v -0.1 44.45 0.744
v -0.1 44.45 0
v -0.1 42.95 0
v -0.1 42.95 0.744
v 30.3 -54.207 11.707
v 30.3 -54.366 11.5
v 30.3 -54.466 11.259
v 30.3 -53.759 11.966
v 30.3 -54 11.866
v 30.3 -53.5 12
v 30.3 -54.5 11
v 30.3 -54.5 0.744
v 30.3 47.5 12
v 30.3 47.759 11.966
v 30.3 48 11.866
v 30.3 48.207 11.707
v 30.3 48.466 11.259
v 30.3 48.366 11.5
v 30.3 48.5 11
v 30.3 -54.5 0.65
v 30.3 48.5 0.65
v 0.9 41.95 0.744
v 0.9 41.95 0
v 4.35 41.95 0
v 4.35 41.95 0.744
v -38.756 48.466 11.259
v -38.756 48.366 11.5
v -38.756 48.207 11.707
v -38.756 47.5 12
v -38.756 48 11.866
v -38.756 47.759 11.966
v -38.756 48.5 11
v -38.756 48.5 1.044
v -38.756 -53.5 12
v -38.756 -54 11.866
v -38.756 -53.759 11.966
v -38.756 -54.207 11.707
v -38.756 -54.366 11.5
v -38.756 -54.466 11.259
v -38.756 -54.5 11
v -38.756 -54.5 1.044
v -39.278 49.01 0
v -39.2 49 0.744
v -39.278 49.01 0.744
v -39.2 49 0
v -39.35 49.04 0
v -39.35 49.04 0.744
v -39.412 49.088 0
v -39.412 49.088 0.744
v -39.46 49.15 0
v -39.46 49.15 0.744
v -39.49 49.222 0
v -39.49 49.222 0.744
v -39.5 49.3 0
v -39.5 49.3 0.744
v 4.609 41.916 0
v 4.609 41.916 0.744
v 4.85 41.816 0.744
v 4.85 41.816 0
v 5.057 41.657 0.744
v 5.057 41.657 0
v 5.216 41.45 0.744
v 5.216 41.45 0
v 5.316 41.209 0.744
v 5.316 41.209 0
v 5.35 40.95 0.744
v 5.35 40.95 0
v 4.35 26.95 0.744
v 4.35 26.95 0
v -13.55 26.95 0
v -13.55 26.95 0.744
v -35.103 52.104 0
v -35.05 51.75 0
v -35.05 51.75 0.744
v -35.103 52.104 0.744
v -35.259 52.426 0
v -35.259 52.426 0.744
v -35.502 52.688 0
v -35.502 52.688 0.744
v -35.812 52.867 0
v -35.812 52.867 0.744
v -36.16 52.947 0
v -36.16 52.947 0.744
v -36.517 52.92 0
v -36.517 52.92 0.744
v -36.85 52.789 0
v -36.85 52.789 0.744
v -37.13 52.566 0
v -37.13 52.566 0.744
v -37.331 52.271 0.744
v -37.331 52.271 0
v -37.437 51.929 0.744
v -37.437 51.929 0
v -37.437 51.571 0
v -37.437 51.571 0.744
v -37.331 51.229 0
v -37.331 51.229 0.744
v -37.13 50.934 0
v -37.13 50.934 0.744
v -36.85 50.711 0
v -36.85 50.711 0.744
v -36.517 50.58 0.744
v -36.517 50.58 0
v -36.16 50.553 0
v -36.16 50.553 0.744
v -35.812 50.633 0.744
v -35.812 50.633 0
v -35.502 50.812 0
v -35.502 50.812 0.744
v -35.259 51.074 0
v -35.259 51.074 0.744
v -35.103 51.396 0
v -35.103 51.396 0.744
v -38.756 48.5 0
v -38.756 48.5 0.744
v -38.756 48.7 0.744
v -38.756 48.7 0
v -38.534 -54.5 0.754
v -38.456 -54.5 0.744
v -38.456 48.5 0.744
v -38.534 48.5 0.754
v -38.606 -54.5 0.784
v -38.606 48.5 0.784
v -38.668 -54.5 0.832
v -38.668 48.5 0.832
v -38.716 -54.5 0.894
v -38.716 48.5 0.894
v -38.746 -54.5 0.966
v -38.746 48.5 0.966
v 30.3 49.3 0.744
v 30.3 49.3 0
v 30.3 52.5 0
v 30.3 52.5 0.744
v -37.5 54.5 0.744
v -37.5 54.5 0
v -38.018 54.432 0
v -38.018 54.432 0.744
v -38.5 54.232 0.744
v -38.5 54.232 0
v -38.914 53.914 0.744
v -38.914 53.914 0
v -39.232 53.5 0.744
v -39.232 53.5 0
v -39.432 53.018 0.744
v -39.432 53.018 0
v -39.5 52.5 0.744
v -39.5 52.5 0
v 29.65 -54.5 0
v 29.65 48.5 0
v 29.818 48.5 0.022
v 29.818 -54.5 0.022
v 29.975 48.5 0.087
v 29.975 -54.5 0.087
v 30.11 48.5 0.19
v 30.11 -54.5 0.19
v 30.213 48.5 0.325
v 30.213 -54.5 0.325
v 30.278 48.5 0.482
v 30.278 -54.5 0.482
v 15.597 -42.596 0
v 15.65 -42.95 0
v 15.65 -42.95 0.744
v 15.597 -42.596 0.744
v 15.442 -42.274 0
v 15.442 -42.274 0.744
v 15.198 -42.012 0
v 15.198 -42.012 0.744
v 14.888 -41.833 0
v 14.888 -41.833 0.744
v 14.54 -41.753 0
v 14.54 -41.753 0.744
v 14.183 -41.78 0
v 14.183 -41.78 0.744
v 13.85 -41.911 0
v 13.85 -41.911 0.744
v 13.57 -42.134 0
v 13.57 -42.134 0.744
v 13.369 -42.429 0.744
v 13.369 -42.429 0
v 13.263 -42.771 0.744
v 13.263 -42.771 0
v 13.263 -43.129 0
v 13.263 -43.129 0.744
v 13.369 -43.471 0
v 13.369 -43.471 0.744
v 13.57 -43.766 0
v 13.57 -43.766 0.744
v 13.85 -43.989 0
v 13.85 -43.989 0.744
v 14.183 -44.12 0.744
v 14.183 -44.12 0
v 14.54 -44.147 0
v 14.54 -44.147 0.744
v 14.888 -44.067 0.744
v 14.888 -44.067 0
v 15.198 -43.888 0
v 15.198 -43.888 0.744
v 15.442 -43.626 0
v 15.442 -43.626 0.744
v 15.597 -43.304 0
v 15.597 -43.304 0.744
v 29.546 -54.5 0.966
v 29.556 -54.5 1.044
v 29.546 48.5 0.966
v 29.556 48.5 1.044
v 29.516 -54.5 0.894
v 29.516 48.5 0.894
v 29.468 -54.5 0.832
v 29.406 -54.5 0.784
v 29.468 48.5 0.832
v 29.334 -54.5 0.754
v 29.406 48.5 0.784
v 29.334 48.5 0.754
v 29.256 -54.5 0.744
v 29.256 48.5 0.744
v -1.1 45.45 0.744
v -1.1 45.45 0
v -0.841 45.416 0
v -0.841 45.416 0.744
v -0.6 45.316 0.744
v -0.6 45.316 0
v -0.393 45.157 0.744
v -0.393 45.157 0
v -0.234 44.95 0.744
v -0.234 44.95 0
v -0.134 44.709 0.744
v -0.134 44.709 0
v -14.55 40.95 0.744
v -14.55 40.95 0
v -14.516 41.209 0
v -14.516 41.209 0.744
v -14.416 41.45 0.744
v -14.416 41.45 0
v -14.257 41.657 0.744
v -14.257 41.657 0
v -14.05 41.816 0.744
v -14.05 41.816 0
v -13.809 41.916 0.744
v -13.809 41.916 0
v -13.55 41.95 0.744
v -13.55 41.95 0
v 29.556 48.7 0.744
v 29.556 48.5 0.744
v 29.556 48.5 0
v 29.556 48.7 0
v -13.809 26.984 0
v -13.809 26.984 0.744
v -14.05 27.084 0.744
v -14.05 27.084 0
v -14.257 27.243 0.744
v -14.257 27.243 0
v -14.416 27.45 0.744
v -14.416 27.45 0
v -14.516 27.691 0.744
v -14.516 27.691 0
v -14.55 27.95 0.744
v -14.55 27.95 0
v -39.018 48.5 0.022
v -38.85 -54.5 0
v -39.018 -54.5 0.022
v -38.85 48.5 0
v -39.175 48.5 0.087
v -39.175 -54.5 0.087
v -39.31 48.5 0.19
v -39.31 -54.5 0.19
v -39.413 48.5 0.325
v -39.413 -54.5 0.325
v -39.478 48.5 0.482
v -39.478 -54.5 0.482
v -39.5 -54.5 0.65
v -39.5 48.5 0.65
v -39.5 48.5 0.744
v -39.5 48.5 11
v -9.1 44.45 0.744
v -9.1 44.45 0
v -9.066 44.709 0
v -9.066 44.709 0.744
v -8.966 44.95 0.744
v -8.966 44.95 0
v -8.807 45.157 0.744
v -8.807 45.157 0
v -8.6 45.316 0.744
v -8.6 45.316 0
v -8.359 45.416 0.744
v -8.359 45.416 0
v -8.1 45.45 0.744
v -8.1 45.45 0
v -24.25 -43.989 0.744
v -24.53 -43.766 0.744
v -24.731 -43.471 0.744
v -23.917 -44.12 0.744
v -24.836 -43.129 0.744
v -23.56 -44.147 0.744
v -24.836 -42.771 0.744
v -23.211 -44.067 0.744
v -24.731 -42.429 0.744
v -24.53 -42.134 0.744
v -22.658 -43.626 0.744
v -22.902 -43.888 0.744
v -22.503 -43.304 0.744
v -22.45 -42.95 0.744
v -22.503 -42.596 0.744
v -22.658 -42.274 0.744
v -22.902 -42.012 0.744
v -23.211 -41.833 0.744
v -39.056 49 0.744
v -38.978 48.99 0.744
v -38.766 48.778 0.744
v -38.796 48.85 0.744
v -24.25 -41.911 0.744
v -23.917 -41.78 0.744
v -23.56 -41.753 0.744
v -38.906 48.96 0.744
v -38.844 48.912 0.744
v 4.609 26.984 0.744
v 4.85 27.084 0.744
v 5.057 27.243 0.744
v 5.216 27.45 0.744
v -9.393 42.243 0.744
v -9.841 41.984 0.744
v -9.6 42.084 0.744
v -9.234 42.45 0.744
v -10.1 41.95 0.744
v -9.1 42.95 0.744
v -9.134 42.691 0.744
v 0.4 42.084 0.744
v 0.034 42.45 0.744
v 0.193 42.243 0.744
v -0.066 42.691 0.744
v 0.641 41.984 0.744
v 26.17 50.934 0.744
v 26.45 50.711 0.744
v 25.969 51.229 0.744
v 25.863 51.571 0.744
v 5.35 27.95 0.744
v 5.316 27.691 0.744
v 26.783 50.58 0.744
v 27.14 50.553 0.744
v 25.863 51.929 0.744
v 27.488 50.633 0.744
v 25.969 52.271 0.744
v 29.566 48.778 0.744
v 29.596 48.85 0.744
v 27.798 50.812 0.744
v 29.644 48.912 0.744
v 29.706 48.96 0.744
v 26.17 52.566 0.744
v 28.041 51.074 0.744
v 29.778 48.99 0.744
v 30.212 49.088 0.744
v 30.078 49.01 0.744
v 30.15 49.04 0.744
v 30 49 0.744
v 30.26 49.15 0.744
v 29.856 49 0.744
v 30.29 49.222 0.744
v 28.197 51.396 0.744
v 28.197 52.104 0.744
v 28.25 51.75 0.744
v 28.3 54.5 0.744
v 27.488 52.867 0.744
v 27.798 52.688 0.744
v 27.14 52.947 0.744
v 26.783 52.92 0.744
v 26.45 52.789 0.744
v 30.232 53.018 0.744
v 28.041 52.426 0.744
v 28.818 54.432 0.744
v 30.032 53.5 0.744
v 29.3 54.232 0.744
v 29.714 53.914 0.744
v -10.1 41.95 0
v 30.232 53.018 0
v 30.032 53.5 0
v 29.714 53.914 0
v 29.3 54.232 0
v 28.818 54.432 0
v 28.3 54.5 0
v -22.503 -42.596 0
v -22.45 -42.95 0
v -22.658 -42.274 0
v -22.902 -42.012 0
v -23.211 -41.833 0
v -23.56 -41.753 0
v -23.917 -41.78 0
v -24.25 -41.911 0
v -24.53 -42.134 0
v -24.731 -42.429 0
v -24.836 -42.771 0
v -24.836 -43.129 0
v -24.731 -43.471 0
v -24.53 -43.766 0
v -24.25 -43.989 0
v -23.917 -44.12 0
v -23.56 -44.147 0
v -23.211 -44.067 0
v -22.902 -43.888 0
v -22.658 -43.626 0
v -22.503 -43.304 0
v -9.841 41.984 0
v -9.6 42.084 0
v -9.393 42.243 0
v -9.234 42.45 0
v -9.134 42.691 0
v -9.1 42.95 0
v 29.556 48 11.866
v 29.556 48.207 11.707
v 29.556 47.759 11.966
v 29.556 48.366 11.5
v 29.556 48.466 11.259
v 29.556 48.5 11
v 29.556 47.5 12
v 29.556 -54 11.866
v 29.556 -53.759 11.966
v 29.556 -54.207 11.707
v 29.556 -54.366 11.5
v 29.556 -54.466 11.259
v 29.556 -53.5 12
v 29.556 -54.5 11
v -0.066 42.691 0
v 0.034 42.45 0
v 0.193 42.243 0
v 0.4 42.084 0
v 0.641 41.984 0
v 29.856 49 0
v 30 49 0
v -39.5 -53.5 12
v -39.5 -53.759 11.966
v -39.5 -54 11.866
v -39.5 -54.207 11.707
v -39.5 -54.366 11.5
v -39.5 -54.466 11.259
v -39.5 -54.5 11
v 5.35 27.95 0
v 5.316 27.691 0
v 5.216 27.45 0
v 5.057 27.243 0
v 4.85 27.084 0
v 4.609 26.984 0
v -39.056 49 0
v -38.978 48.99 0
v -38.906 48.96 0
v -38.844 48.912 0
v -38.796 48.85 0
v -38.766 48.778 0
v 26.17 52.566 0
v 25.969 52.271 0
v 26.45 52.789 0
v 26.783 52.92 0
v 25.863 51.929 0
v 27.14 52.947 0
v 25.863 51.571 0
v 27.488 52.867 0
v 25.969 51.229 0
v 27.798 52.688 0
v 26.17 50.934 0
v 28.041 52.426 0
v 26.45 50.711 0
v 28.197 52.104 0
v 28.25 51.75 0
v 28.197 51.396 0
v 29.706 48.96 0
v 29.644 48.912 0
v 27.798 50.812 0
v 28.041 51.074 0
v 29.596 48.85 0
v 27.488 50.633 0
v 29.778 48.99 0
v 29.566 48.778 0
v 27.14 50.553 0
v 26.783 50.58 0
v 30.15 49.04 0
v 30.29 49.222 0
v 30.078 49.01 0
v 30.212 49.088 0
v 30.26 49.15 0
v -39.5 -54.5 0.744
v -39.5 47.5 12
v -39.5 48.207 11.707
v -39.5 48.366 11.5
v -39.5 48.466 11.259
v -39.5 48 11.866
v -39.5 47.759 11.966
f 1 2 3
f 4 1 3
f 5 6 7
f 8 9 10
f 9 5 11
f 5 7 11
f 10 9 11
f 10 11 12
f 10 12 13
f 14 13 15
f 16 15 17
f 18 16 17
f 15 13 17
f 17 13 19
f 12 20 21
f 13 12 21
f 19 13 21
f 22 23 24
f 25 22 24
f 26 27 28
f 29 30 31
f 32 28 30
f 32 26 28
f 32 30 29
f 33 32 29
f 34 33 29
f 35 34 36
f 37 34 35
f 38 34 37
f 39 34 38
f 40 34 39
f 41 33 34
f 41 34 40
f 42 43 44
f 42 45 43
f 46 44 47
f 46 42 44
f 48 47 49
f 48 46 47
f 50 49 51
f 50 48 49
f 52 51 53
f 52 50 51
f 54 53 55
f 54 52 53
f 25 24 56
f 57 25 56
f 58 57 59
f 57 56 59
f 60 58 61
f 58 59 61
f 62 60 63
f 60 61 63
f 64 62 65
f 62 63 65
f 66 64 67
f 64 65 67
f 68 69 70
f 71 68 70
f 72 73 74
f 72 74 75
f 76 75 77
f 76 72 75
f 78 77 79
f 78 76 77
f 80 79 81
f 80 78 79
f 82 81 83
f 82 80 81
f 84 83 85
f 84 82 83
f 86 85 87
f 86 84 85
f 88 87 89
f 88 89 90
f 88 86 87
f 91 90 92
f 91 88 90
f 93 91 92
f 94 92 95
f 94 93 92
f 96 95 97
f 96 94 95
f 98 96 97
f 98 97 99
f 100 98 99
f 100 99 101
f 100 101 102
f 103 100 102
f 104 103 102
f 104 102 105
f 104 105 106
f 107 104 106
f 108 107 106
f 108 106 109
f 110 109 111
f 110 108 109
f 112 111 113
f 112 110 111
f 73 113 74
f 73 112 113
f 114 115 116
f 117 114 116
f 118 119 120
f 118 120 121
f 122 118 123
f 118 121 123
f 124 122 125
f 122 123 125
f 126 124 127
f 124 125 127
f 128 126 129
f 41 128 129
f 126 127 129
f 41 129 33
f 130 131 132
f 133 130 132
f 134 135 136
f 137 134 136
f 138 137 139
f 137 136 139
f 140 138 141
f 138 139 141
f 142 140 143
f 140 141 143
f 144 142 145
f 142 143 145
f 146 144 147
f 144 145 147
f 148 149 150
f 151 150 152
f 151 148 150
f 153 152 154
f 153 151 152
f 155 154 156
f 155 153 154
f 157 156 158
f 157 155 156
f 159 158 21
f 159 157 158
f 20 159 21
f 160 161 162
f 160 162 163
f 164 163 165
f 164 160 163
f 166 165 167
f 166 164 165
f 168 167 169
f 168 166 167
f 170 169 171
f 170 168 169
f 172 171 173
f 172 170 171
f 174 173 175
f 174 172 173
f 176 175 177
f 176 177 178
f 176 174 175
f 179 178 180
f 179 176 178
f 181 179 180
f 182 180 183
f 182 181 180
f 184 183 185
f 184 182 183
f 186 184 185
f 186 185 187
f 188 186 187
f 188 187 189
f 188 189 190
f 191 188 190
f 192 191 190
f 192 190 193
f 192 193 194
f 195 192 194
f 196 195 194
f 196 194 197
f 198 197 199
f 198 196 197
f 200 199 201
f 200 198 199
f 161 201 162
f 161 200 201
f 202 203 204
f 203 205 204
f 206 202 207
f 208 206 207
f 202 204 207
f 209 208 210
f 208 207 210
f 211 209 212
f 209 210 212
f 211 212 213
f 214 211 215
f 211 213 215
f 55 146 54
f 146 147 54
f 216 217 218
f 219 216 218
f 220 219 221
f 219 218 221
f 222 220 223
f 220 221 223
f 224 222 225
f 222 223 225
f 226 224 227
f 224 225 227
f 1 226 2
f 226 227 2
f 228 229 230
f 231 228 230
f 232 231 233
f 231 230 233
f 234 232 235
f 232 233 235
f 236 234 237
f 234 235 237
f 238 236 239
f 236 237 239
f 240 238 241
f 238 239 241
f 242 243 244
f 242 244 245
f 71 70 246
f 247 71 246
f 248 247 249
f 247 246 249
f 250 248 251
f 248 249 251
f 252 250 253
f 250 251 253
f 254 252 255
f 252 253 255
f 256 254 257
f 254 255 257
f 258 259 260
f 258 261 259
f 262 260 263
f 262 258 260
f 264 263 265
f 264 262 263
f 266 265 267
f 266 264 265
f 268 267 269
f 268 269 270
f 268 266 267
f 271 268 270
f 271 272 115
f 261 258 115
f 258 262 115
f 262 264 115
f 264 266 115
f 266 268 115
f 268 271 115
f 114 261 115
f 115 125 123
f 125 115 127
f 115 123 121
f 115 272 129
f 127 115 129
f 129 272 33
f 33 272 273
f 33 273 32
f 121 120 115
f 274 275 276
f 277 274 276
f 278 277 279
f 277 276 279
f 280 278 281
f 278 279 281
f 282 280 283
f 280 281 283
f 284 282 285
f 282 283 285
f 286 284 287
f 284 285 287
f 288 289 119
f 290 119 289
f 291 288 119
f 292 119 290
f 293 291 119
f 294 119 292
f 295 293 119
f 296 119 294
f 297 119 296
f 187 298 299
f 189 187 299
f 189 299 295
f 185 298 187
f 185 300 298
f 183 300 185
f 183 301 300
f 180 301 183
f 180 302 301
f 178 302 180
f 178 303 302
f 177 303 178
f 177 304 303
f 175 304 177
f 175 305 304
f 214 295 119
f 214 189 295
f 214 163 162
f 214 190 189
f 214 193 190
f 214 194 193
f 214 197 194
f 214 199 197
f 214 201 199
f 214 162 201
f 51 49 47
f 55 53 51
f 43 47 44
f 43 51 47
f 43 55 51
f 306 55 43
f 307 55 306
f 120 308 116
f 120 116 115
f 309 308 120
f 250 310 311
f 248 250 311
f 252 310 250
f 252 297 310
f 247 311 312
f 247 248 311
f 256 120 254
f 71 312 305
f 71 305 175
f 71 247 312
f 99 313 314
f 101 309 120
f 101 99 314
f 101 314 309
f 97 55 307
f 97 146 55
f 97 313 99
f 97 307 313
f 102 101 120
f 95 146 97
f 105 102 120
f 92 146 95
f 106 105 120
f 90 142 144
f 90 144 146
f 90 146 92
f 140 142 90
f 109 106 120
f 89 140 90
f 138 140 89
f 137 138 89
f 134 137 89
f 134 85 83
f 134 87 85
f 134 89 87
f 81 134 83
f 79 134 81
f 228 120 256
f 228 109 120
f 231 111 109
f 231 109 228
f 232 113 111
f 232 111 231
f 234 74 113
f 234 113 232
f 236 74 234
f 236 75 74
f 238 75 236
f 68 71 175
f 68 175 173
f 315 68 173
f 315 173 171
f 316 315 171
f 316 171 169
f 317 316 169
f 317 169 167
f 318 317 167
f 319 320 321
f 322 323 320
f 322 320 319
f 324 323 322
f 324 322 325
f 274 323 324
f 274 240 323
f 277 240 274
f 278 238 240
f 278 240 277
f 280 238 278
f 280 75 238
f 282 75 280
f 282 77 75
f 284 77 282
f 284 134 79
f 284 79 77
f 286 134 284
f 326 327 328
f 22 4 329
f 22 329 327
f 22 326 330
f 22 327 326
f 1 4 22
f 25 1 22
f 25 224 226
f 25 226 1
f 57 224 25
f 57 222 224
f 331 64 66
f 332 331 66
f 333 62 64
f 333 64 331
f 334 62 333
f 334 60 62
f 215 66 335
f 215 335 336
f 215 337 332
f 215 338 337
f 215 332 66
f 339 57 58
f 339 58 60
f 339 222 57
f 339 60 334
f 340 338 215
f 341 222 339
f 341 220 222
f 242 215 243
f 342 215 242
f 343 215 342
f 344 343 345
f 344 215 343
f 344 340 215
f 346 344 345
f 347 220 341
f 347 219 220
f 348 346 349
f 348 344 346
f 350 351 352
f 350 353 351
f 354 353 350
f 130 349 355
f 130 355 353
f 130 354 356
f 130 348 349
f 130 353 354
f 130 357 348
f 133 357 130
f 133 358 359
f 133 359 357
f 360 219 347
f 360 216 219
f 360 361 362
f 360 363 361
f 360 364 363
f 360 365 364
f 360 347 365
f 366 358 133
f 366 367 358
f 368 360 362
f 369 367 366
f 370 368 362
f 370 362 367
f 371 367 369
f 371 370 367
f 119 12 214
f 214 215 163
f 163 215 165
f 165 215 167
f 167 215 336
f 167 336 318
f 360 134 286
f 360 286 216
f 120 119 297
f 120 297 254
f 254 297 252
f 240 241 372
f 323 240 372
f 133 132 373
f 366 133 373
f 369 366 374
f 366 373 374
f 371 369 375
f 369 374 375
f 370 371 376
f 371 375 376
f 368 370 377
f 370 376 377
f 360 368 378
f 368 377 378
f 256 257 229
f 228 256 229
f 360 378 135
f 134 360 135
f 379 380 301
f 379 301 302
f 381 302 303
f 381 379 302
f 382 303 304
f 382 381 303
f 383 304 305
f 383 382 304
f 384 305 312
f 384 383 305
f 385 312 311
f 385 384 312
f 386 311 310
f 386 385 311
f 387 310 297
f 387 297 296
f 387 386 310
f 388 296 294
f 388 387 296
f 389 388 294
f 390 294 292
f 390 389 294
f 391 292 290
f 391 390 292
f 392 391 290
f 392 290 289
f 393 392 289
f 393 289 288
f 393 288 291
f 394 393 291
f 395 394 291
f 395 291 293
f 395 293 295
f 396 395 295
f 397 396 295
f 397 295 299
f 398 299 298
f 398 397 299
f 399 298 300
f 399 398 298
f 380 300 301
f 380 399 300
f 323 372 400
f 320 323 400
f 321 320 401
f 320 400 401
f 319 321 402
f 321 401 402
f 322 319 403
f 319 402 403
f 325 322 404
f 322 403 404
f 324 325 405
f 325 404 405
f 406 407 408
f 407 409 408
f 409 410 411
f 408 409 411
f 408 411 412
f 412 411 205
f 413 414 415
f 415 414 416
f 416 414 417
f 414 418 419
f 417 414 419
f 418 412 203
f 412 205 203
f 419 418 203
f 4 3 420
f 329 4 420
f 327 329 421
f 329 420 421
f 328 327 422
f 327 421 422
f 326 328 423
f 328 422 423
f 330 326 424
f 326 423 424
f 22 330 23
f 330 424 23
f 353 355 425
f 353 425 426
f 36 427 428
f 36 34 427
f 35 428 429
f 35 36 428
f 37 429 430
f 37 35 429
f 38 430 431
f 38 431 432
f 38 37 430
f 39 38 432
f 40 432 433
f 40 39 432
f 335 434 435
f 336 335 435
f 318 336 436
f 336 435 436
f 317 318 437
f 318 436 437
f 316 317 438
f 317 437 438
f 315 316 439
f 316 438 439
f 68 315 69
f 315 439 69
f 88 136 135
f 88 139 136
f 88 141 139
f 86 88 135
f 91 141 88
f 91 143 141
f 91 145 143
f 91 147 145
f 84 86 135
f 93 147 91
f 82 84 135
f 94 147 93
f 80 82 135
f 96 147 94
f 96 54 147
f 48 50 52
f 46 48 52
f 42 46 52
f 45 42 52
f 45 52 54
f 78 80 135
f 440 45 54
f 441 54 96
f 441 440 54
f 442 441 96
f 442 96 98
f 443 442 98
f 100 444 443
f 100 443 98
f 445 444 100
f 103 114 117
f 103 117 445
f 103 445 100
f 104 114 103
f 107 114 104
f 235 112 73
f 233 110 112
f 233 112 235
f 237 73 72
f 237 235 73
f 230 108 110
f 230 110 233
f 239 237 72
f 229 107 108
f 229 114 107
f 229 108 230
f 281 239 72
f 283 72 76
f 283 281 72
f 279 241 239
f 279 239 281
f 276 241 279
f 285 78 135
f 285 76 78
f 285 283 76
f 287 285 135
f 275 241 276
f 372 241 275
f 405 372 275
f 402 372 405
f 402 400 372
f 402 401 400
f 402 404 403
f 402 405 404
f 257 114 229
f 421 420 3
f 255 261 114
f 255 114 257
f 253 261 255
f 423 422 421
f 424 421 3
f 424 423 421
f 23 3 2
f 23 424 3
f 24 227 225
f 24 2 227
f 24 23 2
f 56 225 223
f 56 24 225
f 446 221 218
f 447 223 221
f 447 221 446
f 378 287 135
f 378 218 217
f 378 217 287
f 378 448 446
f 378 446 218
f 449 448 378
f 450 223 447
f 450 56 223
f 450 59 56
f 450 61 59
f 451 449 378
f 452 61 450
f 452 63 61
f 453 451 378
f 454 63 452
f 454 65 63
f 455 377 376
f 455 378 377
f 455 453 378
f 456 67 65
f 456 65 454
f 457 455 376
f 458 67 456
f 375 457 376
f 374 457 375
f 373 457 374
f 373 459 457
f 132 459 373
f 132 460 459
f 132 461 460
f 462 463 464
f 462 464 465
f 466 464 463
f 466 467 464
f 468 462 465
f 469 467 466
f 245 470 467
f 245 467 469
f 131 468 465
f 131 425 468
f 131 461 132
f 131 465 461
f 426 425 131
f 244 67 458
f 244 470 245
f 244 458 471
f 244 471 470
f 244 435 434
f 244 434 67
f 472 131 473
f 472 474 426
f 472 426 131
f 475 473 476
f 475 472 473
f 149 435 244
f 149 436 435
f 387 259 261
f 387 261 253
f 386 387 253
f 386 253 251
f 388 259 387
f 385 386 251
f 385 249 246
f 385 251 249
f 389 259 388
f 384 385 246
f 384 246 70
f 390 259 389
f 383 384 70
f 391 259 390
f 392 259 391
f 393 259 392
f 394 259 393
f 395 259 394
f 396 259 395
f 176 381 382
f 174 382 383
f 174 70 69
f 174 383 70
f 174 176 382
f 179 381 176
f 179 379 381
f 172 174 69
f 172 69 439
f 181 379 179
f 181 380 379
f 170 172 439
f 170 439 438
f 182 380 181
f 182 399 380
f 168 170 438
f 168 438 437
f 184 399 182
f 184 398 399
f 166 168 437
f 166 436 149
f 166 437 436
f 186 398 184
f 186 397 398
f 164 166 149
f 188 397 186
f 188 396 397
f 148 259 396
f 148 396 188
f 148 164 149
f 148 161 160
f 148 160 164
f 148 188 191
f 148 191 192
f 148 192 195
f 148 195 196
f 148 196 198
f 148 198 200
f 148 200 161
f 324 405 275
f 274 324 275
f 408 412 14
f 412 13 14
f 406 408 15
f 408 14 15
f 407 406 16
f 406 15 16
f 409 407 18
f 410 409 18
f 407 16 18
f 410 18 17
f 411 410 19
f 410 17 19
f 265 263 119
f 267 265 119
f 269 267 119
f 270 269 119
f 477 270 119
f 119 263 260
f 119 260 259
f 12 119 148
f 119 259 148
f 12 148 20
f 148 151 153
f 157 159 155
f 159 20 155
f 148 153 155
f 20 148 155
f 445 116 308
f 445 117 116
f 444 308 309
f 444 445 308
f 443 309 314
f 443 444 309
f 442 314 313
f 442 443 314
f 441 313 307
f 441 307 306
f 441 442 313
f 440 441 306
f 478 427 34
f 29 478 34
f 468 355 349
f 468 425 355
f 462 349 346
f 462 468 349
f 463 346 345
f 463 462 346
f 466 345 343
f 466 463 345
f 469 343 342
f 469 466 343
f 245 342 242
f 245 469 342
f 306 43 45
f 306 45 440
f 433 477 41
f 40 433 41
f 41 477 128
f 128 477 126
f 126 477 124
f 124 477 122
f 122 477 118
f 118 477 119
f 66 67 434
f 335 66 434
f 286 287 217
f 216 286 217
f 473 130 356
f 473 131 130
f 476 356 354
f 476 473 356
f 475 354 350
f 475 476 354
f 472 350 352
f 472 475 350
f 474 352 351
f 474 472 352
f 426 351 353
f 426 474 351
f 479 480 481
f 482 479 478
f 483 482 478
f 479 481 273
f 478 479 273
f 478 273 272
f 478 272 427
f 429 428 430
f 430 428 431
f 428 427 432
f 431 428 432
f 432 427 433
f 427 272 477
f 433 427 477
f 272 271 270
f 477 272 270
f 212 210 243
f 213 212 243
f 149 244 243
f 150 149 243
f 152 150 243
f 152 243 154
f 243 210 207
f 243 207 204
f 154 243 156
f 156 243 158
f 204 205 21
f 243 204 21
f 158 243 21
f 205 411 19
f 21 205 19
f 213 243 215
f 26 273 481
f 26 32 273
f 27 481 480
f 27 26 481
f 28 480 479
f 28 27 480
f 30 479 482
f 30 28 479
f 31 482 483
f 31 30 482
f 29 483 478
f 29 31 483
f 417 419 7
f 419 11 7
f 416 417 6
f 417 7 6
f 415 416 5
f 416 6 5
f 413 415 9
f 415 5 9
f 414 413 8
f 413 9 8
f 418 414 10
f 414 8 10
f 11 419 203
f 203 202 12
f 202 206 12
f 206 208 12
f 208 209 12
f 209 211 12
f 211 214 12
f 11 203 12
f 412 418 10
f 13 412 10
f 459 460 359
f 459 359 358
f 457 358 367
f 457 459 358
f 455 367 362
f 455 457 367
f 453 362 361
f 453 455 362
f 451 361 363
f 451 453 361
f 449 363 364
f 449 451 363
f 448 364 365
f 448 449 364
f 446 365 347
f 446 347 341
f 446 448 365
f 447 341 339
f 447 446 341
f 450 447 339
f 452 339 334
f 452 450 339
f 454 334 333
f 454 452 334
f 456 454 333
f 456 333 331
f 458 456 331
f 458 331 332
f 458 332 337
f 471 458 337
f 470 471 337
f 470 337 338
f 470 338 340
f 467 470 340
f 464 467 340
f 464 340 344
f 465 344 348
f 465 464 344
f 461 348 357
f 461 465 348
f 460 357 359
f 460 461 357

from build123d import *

# Parameters (mm, degrees)
F1_R     = 1.2
F2_DEPTH = 0.744
F3_W     = 0.744
F3_H     = 103
F3_H_2   = 103.0000144269
F4_DEPTH = 12
F5_R     = 1
F6_W     = 0.744
F6_H     = 0.5
F7_DEPTH = 25
F8_R     = 0.3
F9_R     = 0.65
F10_R    = 0.3


# Not quite as in the source:
# - ends of sketch curves that miss each other by under 0.0002 mm in the source are joined


with BuildPart() as f2:
    # F1 (on Top) → F2 (new body)
    with BuildSketch(Plane.XY):
        with BuildLine():
            Line((-39.500012, -54.4999965731), (30.29995, -54.5000015731))
            Line((30.29995, -54.5000015731), (30.29995, 52.5000044269))
            ThreePointArc((30.29995, 52.5000044269), (29.7141635624, 53.9142179893), (28.29995, 54.5000044269))
            Line((28.29995, 54.5000044269), (-37.500012, 54.5000044269))
            ThreePointArc((-37.500012, 54.5000044269), (-38.9142255624, 53.9142179893), (-39.500012, 52.5000044269))
            Line((-39.500012, 52.5000044269), (-39.500012, -54.4999965731))
        make_face()
        with Locations((-23.649861, -42.9501055731)):
            Circle(F1_R, mode=Mode.SUBTRACT)
        with Locations((14.450063, -42.9501055731)):
            Circle(F1_R, mode=Mode.SUBTRACT)
        with Locations((-36.250012, 51.7500052865)):
            Circle(F1_R, mode=Mode.SUBTRACT)
        with BuildLine():
            Line((0.899969, 41.9500044269), (4.34995, 41.9500044269))
            ThreePointArc((4.34995, 41.9500044269), (5.0570567812, 41.6571112081), (5.34995, 40.9500044269))
            Line((5.34995, 40.9500044269), (5.34995, 27.9500044269))
            ThreePointArc((5.34995, 27.9500044269), (5.0570567812, 27.2428976457), (4.34995, 26.9500044269))
            Line((4.34995, 26.9500044269), (-13.55005, 26.9500044269))
            ThreePointArc((-13.55005, 26.9500044269), (-14.2571567812, 27.2428976457), (-14.55005, 27.9500044269))
            Line((-14.55005, 27.9500044269), (-14.55005, 40.9500044269))
            ThreePointArc((-14.55005, 40.9500044269), (-14.2571567812, 41.6571112081), (-13.55005, 41.9500044269))
            Line((-13.55005, 41.9500044269), (-10.100031, 41.9500044269))
            ThreePointArc((-10.100031, 41.9500044269), (-9.3929242188, 42.2428976457), (-9.100031, 42.9500044269))
            Line((-9.100031, 42.9500044269), (-9.100031, 44.4500044269))
            ThreePointArc((-9.100031, 44.4500044269), (-8.8071377812, 45.1571112081), (-8.100031, 45.4500044269))
            Line((-8.100031, 45.4500044269), (-4.600031, 45.4500044269))
            Line((-4.600031, 45.4500044269), (-1.100031, 45.4500044269))
            ThreePointArc((-1.100031, 45.4500044269), (-0.3929242188, 45.1571112081), (-0.100031, 44.4500044269))
            Line((-0.100031, 44.4500044269), (-0.100031, 42.9500044269))
            ThreePointArc((-0.100031, 42.9500044269), (0.1928622188, 42.2428976457), (0.899969, 41.9500044269))
        make_face(mode=Mode.SUBTRACT)
        with Locations((27.04995, 51.750023553)):
            Circle(F1_R, mode=Mode.SUBTRACT)
    extrude(amount=F2_DEPTH)

    # F3 (on face) → F4 (join)
    with BuildSketch(Plane(origin=(0, 0, 0), x_dir=(1, 0, 0), z_dir=(0, 0, -1))):
        with Locations((29.92795, 2.9999821461)):
            Rectangle(F3_W, F3_H)
        with Locations((-39.128012, 2.9999893596)):
            Rectangle(F3_W, F3_H_2)
    extrude(amount=-F4_DEPTH)

    # F5
    f5_edges = [f2.edges().sort_by_distance(p)[0] for p in [
        (29.92795, -54.499982, 12),
        (29.92795, 48.500018, 12),
        (-39.128012, 48.500018, 12),
        (-39.128012, -54.499997, 12),
    ]]
    fillet(f5_edges, radius=F5_R)

    # F6 (on face) → F7 (cut)
    with BuildSketch(Plane.XY.offset(0.744)):
        with Locations((-39.128012, 48.7500178539)):
            Rectangle(F6_W, F6_H)
        with Locations((29.92795, 48.7500178539)):
            Rectangle(F6_W, F6_H)
    extrude(amount=-F7_DEPTH, mode=Mode.SUBTRACT)

    # F8
    f8_edges = [f2.edges().sort_by_distance(p)[0] for p in [
        (30.29995, 49.000018, 0.372),
        (29.55595, 49.000018, 0.372),
        (-39.500012, 49.000018, 0.372),
        (-38.756012, 49.000018, 0.372),
    ]]
    fillet(f8_edges, radius=F8_R)

    # F9
    f9_edges = [f2.edges().sort_by_distance(p)[0] for p in [
        (-39.500012, -2.999989, 0),
        (30.29995, -2.999992, 0),
    ]]
    fillet(f9_edges, radius=F9_R)

    # F10
    f10_edges = [f2.edges().sort_by_distance(p)[0] for p in [
        (-38.756012, -2.999989, 0.744),
        (29.55595, -2.999982, 0.744),
    ]]
    fillet(f10_edges, radius=F10_R)


solid = f2.part
